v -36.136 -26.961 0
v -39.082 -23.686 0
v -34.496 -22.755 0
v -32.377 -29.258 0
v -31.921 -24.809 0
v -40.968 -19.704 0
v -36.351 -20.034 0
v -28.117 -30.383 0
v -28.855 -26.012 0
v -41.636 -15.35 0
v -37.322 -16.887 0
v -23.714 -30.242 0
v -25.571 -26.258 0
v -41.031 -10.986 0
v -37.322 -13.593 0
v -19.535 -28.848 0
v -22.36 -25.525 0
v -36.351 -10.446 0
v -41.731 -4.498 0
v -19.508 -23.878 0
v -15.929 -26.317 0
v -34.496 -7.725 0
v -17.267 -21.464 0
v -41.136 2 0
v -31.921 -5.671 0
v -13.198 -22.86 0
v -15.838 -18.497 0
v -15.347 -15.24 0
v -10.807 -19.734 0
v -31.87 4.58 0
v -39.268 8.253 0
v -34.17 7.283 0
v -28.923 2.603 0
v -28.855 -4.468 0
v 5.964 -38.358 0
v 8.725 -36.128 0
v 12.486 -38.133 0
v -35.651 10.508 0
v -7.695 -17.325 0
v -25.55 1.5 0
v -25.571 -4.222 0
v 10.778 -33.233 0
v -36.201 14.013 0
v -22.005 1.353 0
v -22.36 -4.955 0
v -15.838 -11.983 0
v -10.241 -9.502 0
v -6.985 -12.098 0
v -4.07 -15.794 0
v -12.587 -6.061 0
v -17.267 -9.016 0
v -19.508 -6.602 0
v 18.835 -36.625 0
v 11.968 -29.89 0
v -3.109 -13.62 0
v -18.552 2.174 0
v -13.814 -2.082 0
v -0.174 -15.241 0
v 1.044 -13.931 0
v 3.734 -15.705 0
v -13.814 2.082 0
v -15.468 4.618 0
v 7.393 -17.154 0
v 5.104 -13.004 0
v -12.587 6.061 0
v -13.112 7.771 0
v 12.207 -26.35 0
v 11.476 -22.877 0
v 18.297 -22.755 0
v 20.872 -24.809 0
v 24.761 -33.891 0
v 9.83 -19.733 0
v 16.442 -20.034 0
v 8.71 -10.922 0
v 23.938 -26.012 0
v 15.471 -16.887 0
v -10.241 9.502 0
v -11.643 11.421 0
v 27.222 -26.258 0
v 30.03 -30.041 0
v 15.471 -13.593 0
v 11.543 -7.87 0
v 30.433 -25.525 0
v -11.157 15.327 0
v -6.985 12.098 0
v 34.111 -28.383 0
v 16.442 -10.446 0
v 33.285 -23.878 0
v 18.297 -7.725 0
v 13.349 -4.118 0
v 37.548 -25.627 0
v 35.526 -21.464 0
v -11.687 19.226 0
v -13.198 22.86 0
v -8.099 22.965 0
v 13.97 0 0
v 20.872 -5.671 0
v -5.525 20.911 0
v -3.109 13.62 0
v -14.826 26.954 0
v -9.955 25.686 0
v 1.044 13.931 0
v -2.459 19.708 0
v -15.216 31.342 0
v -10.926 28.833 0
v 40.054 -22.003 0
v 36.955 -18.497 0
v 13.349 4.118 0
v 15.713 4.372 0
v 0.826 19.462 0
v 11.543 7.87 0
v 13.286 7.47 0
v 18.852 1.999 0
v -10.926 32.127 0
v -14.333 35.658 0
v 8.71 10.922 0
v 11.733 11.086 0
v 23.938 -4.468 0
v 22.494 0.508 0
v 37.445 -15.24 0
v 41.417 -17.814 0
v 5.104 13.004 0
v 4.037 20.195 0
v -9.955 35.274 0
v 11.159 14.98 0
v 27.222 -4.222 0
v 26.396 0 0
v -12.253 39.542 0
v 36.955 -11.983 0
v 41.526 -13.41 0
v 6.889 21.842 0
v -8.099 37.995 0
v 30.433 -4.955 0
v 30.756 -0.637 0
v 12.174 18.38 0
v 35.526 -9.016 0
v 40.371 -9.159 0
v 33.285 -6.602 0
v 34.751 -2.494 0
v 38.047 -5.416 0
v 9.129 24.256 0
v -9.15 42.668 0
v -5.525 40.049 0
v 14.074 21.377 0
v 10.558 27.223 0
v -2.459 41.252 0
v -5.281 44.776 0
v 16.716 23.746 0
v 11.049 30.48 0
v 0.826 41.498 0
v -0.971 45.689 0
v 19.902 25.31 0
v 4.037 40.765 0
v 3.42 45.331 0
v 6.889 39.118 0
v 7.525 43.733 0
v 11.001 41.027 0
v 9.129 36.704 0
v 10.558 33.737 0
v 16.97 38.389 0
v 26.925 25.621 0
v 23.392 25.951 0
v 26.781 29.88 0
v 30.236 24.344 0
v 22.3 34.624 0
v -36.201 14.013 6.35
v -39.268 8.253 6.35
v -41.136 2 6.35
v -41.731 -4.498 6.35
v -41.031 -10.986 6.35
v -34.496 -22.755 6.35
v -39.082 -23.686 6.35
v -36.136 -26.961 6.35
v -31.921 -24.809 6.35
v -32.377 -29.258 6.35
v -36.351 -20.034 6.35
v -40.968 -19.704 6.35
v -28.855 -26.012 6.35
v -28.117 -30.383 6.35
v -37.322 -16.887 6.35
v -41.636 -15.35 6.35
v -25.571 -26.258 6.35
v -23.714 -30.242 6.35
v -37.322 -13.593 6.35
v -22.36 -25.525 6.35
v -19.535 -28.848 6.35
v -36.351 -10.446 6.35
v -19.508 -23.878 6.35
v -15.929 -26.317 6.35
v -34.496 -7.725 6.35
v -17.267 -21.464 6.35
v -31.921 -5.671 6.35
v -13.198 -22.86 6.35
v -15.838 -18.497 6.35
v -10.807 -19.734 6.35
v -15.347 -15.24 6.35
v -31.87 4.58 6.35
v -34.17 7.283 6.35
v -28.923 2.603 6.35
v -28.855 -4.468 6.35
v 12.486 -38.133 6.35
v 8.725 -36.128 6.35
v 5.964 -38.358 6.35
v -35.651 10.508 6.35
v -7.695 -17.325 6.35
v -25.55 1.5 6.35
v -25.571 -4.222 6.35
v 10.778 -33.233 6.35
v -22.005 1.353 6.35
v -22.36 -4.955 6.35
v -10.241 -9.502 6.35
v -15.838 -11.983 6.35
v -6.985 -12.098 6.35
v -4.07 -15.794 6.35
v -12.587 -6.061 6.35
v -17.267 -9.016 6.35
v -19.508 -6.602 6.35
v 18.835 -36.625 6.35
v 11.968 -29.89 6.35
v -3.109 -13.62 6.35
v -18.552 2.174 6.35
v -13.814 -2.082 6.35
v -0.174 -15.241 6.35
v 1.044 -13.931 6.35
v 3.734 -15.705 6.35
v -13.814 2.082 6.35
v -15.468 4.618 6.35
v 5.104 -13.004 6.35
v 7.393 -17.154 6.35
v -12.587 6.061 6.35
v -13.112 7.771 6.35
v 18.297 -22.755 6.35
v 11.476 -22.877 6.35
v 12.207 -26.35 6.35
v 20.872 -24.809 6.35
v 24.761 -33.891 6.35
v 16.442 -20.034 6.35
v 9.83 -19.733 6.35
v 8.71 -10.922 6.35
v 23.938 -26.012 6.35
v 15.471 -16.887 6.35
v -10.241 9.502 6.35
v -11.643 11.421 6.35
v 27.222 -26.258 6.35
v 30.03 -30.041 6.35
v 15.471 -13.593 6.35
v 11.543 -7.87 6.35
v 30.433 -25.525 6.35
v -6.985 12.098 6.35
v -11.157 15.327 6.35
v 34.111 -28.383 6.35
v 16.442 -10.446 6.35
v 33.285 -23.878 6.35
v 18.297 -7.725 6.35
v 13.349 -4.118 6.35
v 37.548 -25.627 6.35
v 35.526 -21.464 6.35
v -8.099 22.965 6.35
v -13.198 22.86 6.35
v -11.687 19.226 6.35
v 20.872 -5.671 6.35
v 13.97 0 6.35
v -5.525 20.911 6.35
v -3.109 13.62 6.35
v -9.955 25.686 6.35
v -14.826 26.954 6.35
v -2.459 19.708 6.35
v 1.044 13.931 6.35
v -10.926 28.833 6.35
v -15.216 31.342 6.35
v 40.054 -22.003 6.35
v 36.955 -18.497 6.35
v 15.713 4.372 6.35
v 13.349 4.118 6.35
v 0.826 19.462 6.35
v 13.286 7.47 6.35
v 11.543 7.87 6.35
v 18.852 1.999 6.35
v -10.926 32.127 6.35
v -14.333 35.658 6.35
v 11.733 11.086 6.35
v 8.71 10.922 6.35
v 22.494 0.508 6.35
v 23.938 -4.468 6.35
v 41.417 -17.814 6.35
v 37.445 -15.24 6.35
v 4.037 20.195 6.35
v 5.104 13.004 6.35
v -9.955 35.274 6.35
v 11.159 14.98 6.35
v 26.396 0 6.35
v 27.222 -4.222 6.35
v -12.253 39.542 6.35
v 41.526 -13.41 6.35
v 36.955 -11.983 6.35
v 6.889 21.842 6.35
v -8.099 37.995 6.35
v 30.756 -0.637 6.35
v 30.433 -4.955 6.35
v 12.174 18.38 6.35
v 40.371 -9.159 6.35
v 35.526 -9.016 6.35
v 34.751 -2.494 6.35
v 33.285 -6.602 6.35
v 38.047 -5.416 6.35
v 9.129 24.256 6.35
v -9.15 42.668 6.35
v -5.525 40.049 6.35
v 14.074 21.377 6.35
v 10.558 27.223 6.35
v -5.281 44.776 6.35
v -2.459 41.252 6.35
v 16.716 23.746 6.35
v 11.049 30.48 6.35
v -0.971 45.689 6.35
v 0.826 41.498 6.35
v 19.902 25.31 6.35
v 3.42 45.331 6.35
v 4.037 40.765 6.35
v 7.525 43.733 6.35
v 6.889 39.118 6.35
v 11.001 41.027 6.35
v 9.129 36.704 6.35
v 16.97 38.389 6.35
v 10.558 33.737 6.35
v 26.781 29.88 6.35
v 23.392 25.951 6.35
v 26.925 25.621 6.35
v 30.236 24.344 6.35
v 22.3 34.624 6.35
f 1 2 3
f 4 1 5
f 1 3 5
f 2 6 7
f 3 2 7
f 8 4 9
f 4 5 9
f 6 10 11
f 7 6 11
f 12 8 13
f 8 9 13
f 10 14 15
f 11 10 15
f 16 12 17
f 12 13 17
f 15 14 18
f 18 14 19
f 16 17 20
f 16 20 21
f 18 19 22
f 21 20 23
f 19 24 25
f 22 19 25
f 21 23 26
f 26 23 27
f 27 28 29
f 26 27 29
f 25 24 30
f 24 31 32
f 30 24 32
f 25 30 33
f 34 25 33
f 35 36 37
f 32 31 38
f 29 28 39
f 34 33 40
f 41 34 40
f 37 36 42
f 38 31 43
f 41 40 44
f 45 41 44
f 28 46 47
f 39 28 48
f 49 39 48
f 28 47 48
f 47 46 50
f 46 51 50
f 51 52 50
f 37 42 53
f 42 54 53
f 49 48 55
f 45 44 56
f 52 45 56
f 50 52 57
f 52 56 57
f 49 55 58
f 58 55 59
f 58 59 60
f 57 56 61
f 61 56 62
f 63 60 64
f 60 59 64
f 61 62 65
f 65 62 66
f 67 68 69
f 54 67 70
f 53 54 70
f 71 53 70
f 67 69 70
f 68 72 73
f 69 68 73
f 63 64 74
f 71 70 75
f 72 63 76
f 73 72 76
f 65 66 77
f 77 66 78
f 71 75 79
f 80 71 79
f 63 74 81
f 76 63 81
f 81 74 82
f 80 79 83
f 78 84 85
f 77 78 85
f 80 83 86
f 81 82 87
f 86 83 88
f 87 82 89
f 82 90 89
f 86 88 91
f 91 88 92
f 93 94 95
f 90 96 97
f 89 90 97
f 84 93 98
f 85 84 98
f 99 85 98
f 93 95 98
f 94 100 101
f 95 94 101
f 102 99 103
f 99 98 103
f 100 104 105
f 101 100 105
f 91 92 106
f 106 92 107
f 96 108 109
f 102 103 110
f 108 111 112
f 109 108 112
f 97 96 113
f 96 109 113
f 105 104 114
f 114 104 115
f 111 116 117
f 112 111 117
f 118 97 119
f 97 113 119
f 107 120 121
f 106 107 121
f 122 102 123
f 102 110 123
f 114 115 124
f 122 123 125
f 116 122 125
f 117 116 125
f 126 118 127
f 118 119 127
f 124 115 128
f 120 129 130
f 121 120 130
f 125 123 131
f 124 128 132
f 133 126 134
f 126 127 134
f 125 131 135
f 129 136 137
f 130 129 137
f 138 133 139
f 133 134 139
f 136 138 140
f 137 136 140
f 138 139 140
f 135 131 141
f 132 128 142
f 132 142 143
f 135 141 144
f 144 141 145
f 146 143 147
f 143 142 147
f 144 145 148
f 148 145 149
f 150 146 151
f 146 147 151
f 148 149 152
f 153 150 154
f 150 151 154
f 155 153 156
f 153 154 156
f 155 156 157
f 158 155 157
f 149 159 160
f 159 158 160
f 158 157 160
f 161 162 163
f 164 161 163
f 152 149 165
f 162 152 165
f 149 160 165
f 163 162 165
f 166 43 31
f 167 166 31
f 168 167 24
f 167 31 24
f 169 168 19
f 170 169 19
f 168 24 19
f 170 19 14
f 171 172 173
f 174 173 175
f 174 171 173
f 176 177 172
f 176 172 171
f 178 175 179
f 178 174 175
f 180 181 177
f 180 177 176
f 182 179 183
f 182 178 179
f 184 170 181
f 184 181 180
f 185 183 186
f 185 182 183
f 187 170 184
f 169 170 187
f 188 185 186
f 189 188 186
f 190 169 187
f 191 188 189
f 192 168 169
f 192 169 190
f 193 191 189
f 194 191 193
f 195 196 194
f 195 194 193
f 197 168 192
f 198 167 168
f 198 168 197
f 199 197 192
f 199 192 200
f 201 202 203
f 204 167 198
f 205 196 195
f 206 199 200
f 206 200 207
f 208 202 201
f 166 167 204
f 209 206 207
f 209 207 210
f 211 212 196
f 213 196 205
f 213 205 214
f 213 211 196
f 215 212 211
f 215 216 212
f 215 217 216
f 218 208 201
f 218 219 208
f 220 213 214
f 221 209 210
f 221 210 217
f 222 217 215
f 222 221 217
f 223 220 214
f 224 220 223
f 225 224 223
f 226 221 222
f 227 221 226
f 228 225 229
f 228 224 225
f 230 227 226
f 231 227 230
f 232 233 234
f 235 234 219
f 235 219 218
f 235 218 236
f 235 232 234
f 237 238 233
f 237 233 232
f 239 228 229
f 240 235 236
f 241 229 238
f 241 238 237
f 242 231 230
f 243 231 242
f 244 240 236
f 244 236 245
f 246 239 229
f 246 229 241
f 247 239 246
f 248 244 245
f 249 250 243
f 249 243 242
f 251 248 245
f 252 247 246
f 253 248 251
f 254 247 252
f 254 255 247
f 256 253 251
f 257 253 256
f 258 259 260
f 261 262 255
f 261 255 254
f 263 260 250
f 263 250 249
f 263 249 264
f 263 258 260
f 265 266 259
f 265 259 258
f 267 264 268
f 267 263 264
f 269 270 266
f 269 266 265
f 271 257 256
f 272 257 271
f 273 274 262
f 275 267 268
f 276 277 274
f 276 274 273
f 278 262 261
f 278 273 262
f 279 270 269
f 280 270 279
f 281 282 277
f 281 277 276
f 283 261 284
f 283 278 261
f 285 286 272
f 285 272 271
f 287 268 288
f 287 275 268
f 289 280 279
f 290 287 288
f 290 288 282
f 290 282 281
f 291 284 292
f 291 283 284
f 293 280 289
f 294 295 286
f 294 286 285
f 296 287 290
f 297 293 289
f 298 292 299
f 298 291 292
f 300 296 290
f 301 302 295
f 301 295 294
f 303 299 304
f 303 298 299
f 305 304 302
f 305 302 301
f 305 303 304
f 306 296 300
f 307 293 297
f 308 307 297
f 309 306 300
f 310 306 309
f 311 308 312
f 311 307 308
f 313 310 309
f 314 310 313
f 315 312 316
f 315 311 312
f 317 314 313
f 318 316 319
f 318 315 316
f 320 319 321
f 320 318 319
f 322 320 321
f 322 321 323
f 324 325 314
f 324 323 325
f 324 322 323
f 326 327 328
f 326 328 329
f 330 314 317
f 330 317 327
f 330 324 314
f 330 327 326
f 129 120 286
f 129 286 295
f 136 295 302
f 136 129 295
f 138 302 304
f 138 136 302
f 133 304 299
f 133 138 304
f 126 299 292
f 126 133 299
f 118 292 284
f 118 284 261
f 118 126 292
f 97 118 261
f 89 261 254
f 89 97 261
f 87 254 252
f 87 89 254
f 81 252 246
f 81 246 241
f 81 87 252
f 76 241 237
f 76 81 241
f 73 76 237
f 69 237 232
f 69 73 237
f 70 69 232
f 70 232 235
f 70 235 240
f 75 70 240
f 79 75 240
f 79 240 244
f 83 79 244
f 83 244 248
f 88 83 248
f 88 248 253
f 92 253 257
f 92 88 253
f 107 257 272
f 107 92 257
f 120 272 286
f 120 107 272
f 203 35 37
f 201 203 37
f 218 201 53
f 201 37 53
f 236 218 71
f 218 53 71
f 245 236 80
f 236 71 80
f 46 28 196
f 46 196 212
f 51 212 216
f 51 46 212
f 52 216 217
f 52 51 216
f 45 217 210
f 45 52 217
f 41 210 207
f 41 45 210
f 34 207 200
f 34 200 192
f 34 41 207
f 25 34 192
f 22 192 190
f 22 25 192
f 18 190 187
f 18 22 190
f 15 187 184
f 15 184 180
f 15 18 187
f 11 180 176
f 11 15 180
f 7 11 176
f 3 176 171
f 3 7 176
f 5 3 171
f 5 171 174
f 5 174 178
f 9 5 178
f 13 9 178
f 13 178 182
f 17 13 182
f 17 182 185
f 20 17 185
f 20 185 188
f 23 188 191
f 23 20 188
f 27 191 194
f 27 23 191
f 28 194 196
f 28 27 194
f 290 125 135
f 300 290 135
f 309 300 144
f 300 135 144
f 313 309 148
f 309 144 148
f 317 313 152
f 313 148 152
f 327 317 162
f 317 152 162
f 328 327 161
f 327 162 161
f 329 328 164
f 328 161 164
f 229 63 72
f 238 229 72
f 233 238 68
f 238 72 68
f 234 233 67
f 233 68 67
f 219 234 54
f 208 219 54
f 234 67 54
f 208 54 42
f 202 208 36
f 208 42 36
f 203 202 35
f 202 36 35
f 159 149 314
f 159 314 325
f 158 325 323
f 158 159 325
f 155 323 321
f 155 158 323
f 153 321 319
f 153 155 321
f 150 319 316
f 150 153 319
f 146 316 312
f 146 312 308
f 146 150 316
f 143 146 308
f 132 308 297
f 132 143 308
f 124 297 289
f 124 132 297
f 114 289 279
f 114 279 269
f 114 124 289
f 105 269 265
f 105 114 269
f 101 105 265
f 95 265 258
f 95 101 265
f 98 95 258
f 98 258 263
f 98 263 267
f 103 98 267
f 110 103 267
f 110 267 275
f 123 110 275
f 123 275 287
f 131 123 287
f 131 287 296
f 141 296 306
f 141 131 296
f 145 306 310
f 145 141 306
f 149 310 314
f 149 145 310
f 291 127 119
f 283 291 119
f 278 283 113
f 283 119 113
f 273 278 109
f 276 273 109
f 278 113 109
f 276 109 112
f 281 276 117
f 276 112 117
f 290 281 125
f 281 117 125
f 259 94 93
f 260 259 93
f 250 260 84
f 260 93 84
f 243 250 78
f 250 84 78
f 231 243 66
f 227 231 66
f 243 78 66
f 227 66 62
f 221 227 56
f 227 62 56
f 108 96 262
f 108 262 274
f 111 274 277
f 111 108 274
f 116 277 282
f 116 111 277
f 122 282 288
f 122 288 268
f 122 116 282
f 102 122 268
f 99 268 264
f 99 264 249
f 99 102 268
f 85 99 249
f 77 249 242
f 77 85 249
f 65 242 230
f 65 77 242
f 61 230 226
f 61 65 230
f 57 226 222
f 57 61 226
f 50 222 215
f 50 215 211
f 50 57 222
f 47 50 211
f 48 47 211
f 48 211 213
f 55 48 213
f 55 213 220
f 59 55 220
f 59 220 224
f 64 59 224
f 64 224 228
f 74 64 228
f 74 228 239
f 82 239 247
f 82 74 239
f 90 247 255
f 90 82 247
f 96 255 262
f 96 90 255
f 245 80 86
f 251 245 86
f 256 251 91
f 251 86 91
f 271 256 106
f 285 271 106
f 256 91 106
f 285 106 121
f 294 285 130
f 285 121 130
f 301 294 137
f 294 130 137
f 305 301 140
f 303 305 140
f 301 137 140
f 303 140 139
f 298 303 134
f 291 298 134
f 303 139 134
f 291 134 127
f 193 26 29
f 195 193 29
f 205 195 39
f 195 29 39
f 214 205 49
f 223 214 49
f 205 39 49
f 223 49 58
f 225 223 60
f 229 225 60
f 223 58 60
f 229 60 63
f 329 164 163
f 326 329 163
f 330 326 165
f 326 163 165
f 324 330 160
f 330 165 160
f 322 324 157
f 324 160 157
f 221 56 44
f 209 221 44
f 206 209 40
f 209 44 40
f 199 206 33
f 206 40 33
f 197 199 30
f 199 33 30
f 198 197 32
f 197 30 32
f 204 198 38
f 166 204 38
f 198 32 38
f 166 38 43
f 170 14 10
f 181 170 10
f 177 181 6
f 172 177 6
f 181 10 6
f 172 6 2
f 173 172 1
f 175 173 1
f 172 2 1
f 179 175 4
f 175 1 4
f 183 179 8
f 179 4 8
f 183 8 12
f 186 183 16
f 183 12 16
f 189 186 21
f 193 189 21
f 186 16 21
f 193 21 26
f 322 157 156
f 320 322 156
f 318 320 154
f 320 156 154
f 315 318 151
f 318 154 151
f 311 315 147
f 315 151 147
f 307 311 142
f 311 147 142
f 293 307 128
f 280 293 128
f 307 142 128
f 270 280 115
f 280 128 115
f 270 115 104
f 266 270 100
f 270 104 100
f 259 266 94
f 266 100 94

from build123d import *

# Parameters (mm, degrees)
F0_R     = 11.049
F0_R_2   = 13.97
F1_DEPTH = 6.35


with BuildPart() as f1:
    # F0 (on Top) → F1 (new body)
    with BuildSketch(Plane.XY):
        with BuildLine():
            ThreePointArc((30.236339, 24.344128), (22.300275, 34.624256), (11.001122, 41.026701))
            ThreePointArc((11.001122, 41.026701), (-9.14954, 42.667843), (-13.198227, 22.86))
            ThreePointArc((-13.198227, 22.86), (-11.642596, 11.421458), (-18.552146, 2.173844))
            ThreePointArc((-18.552146, 2.173844), (-30.464465, 3.49048), (-36.200803, 14.013374))
            ThreePointArc((-36.200803, 14.013374), (-41.135623, 2.000477), (-41.030727, -10.986099))
            ThreePointArc((-41.030727, -10.986099), (-32.376666, -29.257655), (-13.198227, -22.86))
            ThreePointArc((-13.198227, -22.86), (-4.069975, -15.793513), (7.393468, -17.153552))
            ThreePointArc((7.393468, -17.153552), (12.209388, -28.12824), (5.964463, -38.357502))
            ThreePointArc((5.964463, -38.357502), (18.835348, -36.624733), (30.029604, -30.040602))
            ThreePointArc((30.029604, -30.040602), (41.526206, -13.410188), (26.396454, 0))
            ThreePointArc((26.396454, 0), (15.712571, 4.372055), (11.158677, 14.979707))
            ThreePointArc((11.158677, 14.979707), (18.255077, 24.63776), (30.236339, 24.344128))
        make_face()
        with Locations((-26.396454, -15.24)):
            Circle(F0_R, mode=Mode.SUBTRACT)
        Circle(F0_R_2, mode=Mode.SUBTRACT)
        with Locations((26.396454, -15.24)):
            Circle(F0_R, mode=Mode.SUBTRACT)
        with Locations((0, 30.48)):
            Circle(F0_R, mode=Mode.SUBTRACT)
    extrude(amount=F1_DEPTH)


solid = f1.part
